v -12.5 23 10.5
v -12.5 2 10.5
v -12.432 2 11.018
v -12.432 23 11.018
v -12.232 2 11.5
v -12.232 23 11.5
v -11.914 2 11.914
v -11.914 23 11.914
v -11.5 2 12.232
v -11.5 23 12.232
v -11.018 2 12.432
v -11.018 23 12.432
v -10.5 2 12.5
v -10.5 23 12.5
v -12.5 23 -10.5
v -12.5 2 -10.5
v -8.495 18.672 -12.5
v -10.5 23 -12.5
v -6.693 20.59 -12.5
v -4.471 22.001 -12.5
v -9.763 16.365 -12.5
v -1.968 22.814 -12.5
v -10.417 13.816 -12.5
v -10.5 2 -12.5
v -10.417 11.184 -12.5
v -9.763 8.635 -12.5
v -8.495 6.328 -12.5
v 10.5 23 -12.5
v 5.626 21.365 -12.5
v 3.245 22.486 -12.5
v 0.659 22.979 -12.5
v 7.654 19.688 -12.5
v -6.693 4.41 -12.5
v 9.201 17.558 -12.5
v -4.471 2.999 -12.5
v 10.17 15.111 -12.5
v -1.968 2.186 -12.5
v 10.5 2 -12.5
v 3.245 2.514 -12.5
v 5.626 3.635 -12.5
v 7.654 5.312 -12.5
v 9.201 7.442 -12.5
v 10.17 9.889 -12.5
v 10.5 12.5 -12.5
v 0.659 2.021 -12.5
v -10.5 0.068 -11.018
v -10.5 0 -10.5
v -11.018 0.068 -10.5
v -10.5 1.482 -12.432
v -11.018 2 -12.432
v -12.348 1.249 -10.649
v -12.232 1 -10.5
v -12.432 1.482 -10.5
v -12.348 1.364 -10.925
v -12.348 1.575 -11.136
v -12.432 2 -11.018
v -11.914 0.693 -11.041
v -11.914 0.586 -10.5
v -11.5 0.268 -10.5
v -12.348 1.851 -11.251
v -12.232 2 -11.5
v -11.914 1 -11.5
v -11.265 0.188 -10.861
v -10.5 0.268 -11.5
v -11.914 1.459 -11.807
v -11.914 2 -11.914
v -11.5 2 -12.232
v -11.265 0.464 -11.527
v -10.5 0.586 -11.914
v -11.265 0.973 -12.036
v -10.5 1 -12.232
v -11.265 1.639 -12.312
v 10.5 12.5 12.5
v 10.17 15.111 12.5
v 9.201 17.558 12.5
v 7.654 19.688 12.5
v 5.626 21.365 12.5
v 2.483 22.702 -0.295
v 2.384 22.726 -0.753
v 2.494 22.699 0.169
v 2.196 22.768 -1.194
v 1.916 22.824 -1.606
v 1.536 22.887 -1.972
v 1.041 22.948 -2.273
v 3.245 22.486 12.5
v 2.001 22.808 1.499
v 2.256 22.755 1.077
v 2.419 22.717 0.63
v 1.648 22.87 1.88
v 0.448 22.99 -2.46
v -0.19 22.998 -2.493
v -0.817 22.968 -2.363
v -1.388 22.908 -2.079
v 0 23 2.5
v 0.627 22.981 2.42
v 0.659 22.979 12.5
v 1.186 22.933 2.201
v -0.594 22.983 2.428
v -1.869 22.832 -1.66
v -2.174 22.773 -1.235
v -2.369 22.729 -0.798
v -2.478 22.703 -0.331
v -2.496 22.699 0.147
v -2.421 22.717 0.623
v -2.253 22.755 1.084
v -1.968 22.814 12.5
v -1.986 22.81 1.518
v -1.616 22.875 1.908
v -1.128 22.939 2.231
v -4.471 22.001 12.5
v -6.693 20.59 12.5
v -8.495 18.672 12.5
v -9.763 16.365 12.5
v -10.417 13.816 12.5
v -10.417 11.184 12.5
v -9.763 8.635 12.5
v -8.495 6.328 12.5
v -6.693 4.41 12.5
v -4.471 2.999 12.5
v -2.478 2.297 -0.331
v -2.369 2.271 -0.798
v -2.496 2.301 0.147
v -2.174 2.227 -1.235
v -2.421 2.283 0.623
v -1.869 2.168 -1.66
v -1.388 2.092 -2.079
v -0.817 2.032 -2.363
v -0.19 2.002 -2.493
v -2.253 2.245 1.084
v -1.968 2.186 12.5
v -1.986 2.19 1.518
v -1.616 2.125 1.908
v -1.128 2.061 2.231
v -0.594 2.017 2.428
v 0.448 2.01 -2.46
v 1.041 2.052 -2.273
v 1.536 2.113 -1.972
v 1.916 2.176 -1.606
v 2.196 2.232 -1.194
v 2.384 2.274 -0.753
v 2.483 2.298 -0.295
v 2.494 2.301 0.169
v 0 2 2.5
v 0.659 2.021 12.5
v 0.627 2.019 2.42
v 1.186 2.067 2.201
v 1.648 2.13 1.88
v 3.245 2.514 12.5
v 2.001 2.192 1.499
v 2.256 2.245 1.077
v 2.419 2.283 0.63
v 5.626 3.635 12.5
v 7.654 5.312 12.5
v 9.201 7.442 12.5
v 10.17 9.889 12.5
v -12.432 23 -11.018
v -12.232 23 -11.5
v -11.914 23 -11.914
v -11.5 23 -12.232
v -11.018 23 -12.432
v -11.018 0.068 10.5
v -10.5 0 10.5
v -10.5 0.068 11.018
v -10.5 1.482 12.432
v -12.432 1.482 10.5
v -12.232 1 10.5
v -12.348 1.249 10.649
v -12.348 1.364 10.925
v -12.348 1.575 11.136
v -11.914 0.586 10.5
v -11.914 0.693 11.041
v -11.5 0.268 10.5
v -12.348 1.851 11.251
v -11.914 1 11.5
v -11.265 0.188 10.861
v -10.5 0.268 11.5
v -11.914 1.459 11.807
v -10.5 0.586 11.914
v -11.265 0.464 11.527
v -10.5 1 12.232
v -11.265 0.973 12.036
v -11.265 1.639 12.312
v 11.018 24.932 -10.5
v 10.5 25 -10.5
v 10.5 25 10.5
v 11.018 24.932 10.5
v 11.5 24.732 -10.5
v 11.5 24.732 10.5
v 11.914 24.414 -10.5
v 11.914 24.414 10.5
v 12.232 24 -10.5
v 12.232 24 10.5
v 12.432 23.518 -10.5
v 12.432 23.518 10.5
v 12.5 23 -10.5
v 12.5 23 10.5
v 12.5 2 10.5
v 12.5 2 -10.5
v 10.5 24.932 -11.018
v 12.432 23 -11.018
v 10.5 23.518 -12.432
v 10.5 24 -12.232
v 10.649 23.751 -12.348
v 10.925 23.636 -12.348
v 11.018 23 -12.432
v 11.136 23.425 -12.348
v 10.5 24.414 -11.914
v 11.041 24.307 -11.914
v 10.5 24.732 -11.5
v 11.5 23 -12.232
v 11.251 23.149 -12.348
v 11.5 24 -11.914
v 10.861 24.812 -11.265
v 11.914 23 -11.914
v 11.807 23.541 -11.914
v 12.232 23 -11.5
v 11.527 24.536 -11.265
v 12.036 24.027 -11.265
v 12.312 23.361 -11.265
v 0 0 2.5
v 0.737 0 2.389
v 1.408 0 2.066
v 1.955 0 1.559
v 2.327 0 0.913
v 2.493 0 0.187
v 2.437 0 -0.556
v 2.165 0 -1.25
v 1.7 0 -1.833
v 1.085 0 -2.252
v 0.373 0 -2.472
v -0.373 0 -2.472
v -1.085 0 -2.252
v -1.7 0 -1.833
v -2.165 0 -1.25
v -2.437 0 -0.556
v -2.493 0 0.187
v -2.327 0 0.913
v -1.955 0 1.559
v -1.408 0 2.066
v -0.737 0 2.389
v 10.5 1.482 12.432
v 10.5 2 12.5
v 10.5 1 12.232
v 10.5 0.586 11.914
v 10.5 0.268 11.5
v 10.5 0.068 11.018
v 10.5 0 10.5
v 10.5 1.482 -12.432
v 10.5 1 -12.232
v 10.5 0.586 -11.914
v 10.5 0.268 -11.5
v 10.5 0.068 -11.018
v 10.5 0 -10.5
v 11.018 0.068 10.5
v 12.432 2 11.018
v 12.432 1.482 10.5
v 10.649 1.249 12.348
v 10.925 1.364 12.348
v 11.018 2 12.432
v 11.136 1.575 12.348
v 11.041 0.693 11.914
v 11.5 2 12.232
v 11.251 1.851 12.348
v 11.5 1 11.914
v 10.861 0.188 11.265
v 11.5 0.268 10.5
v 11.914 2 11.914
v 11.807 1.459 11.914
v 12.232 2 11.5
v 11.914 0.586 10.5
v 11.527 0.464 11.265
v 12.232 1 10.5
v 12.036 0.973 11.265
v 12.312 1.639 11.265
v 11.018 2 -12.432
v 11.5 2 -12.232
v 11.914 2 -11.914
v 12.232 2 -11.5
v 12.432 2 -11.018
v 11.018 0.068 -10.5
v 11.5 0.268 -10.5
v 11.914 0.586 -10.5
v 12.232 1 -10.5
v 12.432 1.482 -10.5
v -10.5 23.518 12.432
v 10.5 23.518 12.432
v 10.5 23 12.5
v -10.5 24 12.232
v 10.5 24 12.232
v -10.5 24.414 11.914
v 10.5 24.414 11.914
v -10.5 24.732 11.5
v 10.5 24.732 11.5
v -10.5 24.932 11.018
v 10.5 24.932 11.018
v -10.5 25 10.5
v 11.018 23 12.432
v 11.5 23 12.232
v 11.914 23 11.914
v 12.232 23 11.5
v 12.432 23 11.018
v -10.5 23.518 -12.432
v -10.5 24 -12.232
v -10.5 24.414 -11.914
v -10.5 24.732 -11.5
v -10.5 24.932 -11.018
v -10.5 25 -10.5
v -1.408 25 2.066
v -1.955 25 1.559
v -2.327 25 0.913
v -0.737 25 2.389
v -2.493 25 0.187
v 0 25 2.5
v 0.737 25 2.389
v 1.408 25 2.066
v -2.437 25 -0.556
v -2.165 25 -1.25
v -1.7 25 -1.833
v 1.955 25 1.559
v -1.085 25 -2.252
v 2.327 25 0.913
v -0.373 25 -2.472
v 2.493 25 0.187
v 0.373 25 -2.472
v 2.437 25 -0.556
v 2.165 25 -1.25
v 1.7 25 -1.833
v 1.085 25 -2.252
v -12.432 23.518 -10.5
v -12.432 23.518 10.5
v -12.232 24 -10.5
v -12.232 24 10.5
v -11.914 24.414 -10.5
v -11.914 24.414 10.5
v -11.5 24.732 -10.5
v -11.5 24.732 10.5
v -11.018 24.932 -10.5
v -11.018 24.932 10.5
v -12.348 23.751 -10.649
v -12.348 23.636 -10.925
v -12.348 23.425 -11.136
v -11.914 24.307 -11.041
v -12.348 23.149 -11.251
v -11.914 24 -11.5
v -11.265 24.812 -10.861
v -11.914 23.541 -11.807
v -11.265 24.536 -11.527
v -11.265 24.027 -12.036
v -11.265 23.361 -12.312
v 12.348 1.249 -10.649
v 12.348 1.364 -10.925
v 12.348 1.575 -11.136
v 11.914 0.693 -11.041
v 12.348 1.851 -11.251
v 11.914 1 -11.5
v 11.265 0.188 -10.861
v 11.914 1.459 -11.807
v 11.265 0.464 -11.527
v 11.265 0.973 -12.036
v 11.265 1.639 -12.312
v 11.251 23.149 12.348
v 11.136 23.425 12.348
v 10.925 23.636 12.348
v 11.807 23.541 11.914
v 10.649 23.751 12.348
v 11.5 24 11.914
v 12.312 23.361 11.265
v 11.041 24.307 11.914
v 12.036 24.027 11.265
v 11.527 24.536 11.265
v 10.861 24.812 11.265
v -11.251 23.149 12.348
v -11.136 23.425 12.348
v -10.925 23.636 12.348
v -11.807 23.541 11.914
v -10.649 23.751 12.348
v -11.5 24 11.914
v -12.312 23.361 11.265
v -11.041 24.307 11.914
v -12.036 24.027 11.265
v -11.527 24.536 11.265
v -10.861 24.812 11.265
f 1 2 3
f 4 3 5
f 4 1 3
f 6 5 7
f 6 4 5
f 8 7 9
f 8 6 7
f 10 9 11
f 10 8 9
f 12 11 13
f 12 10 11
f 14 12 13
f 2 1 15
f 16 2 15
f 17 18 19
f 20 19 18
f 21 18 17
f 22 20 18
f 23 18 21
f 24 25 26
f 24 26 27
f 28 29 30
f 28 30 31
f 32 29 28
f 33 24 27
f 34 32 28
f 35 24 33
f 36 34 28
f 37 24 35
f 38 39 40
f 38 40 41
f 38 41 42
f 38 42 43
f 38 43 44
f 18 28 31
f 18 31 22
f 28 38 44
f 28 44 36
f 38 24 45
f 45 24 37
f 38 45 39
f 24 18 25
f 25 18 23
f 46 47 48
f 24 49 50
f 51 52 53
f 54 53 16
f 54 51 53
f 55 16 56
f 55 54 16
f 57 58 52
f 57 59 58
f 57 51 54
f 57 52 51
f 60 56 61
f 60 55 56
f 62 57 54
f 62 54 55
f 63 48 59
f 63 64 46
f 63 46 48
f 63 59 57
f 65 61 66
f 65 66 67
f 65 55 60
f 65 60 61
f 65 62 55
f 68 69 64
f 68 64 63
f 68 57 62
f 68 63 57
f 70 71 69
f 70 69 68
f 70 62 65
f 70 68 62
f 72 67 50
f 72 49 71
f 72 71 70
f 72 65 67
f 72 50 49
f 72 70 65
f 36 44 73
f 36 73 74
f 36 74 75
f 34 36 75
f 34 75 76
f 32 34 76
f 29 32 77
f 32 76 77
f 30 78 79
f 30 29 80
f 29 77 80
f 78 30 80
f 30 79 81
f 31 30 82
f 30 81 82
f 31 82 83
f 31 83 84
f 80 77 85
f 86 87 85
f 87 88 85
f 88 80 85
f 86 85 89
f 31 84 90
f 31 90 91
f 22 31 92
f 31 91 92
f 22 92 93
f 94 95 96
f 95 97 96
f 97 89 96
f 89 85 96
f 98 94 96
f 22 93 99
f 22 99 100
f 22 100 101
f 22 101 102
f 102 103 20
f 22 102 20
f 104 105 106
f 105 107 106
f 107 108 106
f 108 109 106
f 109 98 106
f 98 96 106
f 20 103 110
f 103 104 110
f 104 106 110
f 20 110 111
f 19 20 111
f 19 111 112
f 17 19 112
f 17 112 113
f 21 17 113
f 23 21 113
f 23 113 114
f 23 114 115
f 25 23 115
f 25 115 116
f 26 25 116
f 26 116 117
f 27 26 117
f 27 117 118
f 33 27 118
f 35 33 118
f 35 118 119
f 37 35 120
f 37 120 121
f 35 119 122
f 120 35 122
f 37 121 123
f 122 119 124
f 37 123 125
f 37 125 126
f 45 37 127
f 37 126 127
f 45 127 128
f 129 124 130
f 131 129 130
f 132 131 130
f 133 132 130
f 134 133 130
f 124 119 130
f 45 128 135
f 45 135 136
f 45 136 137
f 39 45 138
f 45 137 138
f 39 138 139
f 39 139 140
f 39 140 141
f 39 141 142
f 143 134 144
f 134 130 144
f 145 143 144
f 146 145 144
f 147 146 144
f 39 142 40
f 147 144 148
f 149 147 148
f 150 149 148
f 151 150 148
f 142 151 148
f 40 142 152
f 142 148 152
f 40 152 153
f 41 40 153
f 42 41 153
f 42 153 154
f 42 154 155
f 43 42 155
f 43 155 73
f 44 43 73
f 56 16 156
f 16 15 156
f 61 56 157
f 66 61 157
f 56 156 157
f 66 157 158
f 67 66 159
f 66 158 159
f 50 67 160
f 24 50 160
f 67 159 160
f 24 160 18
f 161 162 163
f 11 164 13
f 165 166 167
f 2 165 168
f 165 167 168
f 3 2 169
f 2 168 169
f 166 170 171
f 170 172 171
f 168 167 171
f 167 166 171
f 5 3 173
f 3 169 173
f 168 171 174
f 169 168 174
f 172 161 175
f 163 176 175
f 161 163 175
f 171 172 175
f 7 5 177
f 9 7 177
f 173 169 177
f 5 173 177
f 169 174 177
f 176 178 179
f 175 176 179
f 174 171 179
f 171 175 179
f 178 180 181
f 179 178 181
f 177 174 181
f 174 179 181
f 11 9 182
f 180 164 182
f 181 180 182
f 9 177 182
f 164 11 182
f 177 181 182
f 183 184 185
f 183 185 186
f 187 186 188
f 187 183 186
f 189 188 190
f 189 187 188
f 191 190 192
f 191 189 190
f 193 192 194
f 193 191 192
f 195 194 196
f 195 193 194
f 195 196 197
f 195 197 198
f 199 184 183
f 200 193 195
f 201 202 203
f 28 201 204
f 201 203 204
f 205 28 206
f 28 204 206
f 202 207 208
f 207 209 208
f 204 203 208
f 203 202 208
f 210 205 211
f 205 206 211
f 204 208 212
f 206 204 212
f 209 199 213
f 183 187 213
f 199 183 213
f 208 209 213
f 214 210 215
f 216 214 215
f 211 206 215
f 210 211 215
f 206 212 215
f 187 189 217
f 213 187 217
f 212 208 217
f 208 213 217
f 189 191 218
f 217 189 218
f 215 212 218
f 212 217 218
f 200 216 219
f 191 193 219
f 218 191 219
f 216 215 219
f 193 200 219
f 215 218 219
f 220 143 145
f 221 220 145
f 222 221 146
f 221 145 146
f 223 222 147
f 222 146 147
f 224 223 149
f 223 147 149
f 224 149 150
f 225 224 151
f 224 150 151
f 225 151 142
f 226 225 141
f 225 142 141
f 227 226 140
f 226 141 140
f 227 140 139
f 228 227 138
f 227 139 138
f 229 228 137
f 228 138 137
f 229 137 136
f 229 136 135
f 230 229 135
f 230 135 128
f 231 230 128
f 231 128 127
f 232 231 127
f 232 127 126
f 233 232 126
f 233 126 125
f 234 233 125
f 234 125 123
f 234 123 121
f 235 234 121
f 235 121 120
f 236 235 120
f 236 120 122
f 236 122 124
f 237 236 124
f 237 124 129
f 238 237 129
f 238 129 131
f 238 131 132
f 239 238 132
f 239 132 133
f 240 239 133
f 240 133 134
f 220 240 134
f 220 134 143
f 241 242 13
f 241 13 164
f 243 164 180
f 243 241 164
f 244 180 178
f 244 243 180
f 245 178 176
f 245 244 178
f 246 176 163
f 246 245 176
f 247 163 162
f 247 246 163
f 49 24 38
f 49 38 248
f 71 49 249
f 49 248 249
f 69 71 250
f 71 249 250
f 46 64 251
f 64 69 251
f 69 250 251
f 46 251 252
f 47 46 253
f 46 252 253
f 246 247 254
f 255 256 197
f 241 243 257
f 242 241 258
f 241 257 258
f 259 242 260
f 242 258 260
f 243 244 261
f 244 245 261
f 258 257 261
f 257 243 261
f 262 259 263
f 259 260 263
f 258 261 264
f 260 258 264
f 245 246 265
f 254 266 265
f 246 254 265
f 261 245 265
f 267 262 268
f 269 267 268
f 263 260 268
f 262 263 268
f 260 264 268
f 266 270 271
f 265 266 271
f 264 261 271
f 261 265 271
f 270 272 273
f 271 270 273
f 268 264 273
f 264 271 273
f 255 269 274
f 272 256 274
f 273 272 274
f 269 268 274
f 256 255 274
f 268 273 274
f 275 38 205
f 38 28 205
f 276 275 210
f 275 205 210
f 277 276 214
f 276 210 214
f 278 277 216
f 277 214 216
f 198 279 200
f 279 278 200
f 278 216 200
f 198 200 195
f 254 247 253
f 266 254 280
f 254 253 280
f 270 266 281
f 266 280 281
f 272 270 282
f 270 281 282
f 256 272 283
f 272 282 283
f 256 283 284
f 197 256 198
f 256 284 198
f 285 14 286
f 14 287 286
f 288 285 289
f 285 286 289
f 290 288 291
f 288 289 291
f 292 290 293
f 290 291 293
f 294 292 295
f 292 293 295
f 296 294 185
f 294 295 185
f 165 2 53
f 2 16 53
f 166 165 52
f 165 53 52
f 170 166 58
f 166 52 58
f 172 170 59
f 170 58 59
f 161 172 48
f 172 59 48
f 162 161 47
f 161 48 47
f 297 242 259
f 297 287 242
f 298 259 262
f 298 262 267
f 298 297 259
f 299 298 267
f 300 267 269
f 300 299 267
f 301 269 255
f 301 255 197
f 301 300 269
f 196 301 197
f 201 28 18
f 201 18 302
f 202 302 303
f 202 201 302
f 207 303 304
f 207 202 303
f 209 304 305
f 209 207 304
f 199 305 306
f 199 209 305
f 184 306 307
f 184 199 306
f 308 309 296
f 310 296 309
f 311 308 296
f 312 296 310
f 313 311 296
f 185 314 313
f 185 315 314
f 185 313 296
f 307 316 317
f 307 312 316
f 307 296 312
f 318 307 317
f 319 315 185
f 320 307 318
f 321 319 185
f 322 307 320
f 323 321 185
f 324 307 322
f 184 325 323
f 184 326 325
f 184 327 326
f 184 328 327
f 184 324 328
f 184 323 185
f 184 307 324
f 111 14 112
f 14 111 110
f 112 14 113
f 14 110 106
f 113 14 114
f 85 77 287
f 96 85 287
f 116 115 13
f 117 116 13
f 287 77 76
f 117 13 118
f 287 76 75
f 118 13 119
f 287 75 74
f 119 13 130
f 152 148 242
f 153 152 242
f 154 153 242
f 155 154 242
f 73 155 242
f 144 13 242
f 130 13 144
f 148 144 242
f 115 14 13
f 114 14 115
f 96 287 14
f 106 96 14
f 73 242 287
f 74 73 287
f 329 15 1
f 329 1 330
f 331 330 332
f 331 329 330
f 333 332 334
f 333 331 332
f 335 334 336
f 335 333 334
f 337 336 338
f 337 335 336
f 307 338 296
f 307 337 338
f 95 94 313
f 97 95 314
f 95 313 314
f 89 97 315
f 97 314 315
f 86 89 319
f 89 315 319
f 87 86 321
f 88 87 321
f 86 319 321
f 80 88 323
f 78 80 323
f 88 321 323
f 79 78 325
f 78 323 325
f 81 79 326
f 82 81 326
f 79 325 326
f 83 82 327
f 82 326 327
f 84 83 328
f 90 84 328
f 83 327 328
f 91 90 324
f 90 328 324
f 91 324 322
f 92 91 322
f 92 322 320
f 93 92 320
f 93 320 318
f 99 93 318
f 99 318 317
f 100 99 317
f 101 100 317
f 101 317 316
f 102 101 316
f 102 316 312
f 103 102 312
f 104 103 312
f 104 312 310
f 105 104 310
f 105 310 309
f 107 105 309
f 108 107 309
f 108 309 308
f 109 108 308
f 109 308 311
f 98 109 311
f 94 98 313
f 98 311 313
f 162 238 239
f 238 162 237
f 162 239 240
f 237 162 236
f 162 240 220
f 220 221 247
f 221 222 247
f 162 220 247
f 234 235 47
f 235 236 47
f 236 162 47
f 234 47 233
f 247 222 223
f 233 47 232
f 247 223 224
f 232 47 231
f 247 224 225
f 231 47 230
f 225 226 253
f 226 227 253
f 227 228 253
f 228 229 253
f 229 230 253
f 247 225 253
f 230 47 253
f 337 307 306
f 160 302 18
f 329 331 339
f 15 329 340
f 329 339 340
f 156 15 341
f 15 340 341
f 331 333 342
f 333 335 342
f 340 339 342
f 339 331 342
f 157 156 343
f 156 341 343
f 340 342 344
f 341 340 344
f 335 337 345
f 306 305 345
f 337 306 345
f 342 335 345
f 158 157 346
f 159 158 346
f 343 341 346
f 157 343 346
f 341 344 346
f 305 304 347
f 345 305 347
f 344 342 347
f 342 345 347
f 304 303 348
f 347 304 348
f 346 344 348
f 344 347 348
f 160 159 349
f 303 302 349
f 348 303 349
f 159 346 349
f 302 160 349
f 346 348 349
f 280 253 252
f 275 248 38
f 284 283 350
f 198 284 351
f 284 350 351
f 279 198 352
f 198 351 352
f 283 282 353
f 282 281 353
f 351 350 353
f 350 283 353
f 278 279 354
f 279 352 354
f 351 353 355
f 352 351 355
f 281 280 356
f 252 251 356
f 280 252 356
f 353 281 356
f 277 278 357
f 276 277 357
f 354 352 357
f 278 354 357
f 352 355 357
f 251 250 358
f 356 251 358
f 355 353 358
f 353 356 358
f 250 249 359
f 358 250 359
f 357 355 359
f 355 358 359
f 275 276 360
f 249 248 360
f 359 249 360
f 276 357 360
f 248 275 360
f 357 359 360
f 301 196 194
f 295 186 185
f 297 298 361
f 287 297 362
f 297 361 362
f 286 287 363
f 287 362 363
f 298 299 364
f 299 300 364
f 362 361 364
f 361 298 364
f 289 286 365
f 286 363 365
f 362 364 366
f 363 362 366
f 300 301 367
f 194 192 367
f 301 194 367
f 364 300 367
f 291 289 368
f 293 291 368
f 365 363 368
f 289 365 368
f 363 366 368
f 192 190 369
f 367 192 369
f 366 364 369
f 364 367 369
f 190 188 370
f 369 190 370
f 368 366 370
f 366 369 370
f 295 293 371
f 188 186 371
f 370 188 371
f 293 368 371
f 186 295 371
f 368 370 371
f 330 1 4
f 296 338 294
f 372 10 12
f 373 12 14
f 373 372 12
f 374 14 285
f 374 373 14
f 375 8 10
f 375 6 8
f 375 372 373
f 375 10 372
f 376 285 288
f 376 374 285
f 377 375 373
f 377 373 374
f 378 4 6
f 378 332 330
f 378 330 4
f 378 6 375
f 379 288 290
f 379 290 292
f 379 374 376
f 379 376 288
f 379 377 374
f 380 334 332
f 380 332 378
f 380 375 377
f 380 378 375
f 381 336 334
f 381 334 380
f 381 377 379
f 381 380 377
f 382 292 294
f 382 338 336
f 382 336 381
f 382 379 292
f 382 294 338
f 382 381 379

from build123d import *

# Parameters (mm, degrees)
SKETCH1_W           = 25
SKETCH1_H           = 25
BOSS_EXTRUDE1_DEPTH = 25
SKETCH2_R           = 10.5
CUT_EXTRUDE1_DEPTH  = 25
CUT_EXTRUDE2_REACH  = 32.619
SKETCH3_R           = 2.5
FILLET1_R           = 2


with BuildPart() as part:
    # Sketch1 → Boss-Extrude1 (new body)
    with BuildSketch(Plane(origin=(0, 0, 0), x_dir=(1, 0, 0), z_dir=(0, 1, 0))):
        Rectangle(SKETCH1_W, SKETCH1_H)
    extrude(amount=BOSS_EXTRUDE1_DEPTH)

    # Sketch2 → Cut-Extrude1 (cut)
    with BuildSketch(Plane.XY.offset(12.5)):
        with Locations((0, 12.5)):
            Circle(SKETCH2_R)
    extrude(amount=-CUT_EXTRUDE1_DEPTH, mode=Mode.SUBTRACT)

    # Cut-Extrude2: up to this face of the body (flat: up to its plane)
    cut_extrude2_end = Plane(part.part.faces().sort_by_distance((0, 0, 0))[0])
    # Sketch3 → Cut-Extrude2 (cut, up to the picked face)
    with BuildSketch(Plane(origin=(0, 25, 0), x_dir=(1, 0, 0), z_dir=(0, 1, 0)), mode=Mode.PRIVATE) as cut_extrude2_sk1:
        with Locations(Location((0, 0, 0), (0, 0, 270))):
            Circle(SKETCH3_R)
    cut_extrude2_tool1 = split(extrude(cut_extrude2_sk1.sketch, amount=-CUT_EXTRUDE2_REACH, mode=Mode.PRIVATE), bisect_by=cut_extrude2_end, keep=Keep.BOTH, mode=Mode.PRIVATE)
    add(cut_extrude2_tool1.solids().sort_by(Axis((0, 25, 0), (0, -1, 0)))[0], mode=Mode.SUBTRACT)

    # Fillet1
    fillet1_edges = [part.edges().sort_by_distance(p)[0] for p in [
        (12.5, 25, 0),
        (0, 25, -12.5),
        (-12.5, 25, 0),
        (0, 0, -12.5),
        (12.5, 0, 0),
        (0, 0, 12.5),
        (-12.5, 0, 0),
        (-12.5, 12.5, -12.5),
        (12.5, 12.5, -12.5),
        (12.5, 12.5, 12.5),
        (-12.5, 12.5, 12.5),
        (0, 25, 12.5),
    ]]
    fillet(fillet1_edges, radius=FILLET1_R - 0.0001)  # a hair under: the kernel refuses the full size


solid = part.part
